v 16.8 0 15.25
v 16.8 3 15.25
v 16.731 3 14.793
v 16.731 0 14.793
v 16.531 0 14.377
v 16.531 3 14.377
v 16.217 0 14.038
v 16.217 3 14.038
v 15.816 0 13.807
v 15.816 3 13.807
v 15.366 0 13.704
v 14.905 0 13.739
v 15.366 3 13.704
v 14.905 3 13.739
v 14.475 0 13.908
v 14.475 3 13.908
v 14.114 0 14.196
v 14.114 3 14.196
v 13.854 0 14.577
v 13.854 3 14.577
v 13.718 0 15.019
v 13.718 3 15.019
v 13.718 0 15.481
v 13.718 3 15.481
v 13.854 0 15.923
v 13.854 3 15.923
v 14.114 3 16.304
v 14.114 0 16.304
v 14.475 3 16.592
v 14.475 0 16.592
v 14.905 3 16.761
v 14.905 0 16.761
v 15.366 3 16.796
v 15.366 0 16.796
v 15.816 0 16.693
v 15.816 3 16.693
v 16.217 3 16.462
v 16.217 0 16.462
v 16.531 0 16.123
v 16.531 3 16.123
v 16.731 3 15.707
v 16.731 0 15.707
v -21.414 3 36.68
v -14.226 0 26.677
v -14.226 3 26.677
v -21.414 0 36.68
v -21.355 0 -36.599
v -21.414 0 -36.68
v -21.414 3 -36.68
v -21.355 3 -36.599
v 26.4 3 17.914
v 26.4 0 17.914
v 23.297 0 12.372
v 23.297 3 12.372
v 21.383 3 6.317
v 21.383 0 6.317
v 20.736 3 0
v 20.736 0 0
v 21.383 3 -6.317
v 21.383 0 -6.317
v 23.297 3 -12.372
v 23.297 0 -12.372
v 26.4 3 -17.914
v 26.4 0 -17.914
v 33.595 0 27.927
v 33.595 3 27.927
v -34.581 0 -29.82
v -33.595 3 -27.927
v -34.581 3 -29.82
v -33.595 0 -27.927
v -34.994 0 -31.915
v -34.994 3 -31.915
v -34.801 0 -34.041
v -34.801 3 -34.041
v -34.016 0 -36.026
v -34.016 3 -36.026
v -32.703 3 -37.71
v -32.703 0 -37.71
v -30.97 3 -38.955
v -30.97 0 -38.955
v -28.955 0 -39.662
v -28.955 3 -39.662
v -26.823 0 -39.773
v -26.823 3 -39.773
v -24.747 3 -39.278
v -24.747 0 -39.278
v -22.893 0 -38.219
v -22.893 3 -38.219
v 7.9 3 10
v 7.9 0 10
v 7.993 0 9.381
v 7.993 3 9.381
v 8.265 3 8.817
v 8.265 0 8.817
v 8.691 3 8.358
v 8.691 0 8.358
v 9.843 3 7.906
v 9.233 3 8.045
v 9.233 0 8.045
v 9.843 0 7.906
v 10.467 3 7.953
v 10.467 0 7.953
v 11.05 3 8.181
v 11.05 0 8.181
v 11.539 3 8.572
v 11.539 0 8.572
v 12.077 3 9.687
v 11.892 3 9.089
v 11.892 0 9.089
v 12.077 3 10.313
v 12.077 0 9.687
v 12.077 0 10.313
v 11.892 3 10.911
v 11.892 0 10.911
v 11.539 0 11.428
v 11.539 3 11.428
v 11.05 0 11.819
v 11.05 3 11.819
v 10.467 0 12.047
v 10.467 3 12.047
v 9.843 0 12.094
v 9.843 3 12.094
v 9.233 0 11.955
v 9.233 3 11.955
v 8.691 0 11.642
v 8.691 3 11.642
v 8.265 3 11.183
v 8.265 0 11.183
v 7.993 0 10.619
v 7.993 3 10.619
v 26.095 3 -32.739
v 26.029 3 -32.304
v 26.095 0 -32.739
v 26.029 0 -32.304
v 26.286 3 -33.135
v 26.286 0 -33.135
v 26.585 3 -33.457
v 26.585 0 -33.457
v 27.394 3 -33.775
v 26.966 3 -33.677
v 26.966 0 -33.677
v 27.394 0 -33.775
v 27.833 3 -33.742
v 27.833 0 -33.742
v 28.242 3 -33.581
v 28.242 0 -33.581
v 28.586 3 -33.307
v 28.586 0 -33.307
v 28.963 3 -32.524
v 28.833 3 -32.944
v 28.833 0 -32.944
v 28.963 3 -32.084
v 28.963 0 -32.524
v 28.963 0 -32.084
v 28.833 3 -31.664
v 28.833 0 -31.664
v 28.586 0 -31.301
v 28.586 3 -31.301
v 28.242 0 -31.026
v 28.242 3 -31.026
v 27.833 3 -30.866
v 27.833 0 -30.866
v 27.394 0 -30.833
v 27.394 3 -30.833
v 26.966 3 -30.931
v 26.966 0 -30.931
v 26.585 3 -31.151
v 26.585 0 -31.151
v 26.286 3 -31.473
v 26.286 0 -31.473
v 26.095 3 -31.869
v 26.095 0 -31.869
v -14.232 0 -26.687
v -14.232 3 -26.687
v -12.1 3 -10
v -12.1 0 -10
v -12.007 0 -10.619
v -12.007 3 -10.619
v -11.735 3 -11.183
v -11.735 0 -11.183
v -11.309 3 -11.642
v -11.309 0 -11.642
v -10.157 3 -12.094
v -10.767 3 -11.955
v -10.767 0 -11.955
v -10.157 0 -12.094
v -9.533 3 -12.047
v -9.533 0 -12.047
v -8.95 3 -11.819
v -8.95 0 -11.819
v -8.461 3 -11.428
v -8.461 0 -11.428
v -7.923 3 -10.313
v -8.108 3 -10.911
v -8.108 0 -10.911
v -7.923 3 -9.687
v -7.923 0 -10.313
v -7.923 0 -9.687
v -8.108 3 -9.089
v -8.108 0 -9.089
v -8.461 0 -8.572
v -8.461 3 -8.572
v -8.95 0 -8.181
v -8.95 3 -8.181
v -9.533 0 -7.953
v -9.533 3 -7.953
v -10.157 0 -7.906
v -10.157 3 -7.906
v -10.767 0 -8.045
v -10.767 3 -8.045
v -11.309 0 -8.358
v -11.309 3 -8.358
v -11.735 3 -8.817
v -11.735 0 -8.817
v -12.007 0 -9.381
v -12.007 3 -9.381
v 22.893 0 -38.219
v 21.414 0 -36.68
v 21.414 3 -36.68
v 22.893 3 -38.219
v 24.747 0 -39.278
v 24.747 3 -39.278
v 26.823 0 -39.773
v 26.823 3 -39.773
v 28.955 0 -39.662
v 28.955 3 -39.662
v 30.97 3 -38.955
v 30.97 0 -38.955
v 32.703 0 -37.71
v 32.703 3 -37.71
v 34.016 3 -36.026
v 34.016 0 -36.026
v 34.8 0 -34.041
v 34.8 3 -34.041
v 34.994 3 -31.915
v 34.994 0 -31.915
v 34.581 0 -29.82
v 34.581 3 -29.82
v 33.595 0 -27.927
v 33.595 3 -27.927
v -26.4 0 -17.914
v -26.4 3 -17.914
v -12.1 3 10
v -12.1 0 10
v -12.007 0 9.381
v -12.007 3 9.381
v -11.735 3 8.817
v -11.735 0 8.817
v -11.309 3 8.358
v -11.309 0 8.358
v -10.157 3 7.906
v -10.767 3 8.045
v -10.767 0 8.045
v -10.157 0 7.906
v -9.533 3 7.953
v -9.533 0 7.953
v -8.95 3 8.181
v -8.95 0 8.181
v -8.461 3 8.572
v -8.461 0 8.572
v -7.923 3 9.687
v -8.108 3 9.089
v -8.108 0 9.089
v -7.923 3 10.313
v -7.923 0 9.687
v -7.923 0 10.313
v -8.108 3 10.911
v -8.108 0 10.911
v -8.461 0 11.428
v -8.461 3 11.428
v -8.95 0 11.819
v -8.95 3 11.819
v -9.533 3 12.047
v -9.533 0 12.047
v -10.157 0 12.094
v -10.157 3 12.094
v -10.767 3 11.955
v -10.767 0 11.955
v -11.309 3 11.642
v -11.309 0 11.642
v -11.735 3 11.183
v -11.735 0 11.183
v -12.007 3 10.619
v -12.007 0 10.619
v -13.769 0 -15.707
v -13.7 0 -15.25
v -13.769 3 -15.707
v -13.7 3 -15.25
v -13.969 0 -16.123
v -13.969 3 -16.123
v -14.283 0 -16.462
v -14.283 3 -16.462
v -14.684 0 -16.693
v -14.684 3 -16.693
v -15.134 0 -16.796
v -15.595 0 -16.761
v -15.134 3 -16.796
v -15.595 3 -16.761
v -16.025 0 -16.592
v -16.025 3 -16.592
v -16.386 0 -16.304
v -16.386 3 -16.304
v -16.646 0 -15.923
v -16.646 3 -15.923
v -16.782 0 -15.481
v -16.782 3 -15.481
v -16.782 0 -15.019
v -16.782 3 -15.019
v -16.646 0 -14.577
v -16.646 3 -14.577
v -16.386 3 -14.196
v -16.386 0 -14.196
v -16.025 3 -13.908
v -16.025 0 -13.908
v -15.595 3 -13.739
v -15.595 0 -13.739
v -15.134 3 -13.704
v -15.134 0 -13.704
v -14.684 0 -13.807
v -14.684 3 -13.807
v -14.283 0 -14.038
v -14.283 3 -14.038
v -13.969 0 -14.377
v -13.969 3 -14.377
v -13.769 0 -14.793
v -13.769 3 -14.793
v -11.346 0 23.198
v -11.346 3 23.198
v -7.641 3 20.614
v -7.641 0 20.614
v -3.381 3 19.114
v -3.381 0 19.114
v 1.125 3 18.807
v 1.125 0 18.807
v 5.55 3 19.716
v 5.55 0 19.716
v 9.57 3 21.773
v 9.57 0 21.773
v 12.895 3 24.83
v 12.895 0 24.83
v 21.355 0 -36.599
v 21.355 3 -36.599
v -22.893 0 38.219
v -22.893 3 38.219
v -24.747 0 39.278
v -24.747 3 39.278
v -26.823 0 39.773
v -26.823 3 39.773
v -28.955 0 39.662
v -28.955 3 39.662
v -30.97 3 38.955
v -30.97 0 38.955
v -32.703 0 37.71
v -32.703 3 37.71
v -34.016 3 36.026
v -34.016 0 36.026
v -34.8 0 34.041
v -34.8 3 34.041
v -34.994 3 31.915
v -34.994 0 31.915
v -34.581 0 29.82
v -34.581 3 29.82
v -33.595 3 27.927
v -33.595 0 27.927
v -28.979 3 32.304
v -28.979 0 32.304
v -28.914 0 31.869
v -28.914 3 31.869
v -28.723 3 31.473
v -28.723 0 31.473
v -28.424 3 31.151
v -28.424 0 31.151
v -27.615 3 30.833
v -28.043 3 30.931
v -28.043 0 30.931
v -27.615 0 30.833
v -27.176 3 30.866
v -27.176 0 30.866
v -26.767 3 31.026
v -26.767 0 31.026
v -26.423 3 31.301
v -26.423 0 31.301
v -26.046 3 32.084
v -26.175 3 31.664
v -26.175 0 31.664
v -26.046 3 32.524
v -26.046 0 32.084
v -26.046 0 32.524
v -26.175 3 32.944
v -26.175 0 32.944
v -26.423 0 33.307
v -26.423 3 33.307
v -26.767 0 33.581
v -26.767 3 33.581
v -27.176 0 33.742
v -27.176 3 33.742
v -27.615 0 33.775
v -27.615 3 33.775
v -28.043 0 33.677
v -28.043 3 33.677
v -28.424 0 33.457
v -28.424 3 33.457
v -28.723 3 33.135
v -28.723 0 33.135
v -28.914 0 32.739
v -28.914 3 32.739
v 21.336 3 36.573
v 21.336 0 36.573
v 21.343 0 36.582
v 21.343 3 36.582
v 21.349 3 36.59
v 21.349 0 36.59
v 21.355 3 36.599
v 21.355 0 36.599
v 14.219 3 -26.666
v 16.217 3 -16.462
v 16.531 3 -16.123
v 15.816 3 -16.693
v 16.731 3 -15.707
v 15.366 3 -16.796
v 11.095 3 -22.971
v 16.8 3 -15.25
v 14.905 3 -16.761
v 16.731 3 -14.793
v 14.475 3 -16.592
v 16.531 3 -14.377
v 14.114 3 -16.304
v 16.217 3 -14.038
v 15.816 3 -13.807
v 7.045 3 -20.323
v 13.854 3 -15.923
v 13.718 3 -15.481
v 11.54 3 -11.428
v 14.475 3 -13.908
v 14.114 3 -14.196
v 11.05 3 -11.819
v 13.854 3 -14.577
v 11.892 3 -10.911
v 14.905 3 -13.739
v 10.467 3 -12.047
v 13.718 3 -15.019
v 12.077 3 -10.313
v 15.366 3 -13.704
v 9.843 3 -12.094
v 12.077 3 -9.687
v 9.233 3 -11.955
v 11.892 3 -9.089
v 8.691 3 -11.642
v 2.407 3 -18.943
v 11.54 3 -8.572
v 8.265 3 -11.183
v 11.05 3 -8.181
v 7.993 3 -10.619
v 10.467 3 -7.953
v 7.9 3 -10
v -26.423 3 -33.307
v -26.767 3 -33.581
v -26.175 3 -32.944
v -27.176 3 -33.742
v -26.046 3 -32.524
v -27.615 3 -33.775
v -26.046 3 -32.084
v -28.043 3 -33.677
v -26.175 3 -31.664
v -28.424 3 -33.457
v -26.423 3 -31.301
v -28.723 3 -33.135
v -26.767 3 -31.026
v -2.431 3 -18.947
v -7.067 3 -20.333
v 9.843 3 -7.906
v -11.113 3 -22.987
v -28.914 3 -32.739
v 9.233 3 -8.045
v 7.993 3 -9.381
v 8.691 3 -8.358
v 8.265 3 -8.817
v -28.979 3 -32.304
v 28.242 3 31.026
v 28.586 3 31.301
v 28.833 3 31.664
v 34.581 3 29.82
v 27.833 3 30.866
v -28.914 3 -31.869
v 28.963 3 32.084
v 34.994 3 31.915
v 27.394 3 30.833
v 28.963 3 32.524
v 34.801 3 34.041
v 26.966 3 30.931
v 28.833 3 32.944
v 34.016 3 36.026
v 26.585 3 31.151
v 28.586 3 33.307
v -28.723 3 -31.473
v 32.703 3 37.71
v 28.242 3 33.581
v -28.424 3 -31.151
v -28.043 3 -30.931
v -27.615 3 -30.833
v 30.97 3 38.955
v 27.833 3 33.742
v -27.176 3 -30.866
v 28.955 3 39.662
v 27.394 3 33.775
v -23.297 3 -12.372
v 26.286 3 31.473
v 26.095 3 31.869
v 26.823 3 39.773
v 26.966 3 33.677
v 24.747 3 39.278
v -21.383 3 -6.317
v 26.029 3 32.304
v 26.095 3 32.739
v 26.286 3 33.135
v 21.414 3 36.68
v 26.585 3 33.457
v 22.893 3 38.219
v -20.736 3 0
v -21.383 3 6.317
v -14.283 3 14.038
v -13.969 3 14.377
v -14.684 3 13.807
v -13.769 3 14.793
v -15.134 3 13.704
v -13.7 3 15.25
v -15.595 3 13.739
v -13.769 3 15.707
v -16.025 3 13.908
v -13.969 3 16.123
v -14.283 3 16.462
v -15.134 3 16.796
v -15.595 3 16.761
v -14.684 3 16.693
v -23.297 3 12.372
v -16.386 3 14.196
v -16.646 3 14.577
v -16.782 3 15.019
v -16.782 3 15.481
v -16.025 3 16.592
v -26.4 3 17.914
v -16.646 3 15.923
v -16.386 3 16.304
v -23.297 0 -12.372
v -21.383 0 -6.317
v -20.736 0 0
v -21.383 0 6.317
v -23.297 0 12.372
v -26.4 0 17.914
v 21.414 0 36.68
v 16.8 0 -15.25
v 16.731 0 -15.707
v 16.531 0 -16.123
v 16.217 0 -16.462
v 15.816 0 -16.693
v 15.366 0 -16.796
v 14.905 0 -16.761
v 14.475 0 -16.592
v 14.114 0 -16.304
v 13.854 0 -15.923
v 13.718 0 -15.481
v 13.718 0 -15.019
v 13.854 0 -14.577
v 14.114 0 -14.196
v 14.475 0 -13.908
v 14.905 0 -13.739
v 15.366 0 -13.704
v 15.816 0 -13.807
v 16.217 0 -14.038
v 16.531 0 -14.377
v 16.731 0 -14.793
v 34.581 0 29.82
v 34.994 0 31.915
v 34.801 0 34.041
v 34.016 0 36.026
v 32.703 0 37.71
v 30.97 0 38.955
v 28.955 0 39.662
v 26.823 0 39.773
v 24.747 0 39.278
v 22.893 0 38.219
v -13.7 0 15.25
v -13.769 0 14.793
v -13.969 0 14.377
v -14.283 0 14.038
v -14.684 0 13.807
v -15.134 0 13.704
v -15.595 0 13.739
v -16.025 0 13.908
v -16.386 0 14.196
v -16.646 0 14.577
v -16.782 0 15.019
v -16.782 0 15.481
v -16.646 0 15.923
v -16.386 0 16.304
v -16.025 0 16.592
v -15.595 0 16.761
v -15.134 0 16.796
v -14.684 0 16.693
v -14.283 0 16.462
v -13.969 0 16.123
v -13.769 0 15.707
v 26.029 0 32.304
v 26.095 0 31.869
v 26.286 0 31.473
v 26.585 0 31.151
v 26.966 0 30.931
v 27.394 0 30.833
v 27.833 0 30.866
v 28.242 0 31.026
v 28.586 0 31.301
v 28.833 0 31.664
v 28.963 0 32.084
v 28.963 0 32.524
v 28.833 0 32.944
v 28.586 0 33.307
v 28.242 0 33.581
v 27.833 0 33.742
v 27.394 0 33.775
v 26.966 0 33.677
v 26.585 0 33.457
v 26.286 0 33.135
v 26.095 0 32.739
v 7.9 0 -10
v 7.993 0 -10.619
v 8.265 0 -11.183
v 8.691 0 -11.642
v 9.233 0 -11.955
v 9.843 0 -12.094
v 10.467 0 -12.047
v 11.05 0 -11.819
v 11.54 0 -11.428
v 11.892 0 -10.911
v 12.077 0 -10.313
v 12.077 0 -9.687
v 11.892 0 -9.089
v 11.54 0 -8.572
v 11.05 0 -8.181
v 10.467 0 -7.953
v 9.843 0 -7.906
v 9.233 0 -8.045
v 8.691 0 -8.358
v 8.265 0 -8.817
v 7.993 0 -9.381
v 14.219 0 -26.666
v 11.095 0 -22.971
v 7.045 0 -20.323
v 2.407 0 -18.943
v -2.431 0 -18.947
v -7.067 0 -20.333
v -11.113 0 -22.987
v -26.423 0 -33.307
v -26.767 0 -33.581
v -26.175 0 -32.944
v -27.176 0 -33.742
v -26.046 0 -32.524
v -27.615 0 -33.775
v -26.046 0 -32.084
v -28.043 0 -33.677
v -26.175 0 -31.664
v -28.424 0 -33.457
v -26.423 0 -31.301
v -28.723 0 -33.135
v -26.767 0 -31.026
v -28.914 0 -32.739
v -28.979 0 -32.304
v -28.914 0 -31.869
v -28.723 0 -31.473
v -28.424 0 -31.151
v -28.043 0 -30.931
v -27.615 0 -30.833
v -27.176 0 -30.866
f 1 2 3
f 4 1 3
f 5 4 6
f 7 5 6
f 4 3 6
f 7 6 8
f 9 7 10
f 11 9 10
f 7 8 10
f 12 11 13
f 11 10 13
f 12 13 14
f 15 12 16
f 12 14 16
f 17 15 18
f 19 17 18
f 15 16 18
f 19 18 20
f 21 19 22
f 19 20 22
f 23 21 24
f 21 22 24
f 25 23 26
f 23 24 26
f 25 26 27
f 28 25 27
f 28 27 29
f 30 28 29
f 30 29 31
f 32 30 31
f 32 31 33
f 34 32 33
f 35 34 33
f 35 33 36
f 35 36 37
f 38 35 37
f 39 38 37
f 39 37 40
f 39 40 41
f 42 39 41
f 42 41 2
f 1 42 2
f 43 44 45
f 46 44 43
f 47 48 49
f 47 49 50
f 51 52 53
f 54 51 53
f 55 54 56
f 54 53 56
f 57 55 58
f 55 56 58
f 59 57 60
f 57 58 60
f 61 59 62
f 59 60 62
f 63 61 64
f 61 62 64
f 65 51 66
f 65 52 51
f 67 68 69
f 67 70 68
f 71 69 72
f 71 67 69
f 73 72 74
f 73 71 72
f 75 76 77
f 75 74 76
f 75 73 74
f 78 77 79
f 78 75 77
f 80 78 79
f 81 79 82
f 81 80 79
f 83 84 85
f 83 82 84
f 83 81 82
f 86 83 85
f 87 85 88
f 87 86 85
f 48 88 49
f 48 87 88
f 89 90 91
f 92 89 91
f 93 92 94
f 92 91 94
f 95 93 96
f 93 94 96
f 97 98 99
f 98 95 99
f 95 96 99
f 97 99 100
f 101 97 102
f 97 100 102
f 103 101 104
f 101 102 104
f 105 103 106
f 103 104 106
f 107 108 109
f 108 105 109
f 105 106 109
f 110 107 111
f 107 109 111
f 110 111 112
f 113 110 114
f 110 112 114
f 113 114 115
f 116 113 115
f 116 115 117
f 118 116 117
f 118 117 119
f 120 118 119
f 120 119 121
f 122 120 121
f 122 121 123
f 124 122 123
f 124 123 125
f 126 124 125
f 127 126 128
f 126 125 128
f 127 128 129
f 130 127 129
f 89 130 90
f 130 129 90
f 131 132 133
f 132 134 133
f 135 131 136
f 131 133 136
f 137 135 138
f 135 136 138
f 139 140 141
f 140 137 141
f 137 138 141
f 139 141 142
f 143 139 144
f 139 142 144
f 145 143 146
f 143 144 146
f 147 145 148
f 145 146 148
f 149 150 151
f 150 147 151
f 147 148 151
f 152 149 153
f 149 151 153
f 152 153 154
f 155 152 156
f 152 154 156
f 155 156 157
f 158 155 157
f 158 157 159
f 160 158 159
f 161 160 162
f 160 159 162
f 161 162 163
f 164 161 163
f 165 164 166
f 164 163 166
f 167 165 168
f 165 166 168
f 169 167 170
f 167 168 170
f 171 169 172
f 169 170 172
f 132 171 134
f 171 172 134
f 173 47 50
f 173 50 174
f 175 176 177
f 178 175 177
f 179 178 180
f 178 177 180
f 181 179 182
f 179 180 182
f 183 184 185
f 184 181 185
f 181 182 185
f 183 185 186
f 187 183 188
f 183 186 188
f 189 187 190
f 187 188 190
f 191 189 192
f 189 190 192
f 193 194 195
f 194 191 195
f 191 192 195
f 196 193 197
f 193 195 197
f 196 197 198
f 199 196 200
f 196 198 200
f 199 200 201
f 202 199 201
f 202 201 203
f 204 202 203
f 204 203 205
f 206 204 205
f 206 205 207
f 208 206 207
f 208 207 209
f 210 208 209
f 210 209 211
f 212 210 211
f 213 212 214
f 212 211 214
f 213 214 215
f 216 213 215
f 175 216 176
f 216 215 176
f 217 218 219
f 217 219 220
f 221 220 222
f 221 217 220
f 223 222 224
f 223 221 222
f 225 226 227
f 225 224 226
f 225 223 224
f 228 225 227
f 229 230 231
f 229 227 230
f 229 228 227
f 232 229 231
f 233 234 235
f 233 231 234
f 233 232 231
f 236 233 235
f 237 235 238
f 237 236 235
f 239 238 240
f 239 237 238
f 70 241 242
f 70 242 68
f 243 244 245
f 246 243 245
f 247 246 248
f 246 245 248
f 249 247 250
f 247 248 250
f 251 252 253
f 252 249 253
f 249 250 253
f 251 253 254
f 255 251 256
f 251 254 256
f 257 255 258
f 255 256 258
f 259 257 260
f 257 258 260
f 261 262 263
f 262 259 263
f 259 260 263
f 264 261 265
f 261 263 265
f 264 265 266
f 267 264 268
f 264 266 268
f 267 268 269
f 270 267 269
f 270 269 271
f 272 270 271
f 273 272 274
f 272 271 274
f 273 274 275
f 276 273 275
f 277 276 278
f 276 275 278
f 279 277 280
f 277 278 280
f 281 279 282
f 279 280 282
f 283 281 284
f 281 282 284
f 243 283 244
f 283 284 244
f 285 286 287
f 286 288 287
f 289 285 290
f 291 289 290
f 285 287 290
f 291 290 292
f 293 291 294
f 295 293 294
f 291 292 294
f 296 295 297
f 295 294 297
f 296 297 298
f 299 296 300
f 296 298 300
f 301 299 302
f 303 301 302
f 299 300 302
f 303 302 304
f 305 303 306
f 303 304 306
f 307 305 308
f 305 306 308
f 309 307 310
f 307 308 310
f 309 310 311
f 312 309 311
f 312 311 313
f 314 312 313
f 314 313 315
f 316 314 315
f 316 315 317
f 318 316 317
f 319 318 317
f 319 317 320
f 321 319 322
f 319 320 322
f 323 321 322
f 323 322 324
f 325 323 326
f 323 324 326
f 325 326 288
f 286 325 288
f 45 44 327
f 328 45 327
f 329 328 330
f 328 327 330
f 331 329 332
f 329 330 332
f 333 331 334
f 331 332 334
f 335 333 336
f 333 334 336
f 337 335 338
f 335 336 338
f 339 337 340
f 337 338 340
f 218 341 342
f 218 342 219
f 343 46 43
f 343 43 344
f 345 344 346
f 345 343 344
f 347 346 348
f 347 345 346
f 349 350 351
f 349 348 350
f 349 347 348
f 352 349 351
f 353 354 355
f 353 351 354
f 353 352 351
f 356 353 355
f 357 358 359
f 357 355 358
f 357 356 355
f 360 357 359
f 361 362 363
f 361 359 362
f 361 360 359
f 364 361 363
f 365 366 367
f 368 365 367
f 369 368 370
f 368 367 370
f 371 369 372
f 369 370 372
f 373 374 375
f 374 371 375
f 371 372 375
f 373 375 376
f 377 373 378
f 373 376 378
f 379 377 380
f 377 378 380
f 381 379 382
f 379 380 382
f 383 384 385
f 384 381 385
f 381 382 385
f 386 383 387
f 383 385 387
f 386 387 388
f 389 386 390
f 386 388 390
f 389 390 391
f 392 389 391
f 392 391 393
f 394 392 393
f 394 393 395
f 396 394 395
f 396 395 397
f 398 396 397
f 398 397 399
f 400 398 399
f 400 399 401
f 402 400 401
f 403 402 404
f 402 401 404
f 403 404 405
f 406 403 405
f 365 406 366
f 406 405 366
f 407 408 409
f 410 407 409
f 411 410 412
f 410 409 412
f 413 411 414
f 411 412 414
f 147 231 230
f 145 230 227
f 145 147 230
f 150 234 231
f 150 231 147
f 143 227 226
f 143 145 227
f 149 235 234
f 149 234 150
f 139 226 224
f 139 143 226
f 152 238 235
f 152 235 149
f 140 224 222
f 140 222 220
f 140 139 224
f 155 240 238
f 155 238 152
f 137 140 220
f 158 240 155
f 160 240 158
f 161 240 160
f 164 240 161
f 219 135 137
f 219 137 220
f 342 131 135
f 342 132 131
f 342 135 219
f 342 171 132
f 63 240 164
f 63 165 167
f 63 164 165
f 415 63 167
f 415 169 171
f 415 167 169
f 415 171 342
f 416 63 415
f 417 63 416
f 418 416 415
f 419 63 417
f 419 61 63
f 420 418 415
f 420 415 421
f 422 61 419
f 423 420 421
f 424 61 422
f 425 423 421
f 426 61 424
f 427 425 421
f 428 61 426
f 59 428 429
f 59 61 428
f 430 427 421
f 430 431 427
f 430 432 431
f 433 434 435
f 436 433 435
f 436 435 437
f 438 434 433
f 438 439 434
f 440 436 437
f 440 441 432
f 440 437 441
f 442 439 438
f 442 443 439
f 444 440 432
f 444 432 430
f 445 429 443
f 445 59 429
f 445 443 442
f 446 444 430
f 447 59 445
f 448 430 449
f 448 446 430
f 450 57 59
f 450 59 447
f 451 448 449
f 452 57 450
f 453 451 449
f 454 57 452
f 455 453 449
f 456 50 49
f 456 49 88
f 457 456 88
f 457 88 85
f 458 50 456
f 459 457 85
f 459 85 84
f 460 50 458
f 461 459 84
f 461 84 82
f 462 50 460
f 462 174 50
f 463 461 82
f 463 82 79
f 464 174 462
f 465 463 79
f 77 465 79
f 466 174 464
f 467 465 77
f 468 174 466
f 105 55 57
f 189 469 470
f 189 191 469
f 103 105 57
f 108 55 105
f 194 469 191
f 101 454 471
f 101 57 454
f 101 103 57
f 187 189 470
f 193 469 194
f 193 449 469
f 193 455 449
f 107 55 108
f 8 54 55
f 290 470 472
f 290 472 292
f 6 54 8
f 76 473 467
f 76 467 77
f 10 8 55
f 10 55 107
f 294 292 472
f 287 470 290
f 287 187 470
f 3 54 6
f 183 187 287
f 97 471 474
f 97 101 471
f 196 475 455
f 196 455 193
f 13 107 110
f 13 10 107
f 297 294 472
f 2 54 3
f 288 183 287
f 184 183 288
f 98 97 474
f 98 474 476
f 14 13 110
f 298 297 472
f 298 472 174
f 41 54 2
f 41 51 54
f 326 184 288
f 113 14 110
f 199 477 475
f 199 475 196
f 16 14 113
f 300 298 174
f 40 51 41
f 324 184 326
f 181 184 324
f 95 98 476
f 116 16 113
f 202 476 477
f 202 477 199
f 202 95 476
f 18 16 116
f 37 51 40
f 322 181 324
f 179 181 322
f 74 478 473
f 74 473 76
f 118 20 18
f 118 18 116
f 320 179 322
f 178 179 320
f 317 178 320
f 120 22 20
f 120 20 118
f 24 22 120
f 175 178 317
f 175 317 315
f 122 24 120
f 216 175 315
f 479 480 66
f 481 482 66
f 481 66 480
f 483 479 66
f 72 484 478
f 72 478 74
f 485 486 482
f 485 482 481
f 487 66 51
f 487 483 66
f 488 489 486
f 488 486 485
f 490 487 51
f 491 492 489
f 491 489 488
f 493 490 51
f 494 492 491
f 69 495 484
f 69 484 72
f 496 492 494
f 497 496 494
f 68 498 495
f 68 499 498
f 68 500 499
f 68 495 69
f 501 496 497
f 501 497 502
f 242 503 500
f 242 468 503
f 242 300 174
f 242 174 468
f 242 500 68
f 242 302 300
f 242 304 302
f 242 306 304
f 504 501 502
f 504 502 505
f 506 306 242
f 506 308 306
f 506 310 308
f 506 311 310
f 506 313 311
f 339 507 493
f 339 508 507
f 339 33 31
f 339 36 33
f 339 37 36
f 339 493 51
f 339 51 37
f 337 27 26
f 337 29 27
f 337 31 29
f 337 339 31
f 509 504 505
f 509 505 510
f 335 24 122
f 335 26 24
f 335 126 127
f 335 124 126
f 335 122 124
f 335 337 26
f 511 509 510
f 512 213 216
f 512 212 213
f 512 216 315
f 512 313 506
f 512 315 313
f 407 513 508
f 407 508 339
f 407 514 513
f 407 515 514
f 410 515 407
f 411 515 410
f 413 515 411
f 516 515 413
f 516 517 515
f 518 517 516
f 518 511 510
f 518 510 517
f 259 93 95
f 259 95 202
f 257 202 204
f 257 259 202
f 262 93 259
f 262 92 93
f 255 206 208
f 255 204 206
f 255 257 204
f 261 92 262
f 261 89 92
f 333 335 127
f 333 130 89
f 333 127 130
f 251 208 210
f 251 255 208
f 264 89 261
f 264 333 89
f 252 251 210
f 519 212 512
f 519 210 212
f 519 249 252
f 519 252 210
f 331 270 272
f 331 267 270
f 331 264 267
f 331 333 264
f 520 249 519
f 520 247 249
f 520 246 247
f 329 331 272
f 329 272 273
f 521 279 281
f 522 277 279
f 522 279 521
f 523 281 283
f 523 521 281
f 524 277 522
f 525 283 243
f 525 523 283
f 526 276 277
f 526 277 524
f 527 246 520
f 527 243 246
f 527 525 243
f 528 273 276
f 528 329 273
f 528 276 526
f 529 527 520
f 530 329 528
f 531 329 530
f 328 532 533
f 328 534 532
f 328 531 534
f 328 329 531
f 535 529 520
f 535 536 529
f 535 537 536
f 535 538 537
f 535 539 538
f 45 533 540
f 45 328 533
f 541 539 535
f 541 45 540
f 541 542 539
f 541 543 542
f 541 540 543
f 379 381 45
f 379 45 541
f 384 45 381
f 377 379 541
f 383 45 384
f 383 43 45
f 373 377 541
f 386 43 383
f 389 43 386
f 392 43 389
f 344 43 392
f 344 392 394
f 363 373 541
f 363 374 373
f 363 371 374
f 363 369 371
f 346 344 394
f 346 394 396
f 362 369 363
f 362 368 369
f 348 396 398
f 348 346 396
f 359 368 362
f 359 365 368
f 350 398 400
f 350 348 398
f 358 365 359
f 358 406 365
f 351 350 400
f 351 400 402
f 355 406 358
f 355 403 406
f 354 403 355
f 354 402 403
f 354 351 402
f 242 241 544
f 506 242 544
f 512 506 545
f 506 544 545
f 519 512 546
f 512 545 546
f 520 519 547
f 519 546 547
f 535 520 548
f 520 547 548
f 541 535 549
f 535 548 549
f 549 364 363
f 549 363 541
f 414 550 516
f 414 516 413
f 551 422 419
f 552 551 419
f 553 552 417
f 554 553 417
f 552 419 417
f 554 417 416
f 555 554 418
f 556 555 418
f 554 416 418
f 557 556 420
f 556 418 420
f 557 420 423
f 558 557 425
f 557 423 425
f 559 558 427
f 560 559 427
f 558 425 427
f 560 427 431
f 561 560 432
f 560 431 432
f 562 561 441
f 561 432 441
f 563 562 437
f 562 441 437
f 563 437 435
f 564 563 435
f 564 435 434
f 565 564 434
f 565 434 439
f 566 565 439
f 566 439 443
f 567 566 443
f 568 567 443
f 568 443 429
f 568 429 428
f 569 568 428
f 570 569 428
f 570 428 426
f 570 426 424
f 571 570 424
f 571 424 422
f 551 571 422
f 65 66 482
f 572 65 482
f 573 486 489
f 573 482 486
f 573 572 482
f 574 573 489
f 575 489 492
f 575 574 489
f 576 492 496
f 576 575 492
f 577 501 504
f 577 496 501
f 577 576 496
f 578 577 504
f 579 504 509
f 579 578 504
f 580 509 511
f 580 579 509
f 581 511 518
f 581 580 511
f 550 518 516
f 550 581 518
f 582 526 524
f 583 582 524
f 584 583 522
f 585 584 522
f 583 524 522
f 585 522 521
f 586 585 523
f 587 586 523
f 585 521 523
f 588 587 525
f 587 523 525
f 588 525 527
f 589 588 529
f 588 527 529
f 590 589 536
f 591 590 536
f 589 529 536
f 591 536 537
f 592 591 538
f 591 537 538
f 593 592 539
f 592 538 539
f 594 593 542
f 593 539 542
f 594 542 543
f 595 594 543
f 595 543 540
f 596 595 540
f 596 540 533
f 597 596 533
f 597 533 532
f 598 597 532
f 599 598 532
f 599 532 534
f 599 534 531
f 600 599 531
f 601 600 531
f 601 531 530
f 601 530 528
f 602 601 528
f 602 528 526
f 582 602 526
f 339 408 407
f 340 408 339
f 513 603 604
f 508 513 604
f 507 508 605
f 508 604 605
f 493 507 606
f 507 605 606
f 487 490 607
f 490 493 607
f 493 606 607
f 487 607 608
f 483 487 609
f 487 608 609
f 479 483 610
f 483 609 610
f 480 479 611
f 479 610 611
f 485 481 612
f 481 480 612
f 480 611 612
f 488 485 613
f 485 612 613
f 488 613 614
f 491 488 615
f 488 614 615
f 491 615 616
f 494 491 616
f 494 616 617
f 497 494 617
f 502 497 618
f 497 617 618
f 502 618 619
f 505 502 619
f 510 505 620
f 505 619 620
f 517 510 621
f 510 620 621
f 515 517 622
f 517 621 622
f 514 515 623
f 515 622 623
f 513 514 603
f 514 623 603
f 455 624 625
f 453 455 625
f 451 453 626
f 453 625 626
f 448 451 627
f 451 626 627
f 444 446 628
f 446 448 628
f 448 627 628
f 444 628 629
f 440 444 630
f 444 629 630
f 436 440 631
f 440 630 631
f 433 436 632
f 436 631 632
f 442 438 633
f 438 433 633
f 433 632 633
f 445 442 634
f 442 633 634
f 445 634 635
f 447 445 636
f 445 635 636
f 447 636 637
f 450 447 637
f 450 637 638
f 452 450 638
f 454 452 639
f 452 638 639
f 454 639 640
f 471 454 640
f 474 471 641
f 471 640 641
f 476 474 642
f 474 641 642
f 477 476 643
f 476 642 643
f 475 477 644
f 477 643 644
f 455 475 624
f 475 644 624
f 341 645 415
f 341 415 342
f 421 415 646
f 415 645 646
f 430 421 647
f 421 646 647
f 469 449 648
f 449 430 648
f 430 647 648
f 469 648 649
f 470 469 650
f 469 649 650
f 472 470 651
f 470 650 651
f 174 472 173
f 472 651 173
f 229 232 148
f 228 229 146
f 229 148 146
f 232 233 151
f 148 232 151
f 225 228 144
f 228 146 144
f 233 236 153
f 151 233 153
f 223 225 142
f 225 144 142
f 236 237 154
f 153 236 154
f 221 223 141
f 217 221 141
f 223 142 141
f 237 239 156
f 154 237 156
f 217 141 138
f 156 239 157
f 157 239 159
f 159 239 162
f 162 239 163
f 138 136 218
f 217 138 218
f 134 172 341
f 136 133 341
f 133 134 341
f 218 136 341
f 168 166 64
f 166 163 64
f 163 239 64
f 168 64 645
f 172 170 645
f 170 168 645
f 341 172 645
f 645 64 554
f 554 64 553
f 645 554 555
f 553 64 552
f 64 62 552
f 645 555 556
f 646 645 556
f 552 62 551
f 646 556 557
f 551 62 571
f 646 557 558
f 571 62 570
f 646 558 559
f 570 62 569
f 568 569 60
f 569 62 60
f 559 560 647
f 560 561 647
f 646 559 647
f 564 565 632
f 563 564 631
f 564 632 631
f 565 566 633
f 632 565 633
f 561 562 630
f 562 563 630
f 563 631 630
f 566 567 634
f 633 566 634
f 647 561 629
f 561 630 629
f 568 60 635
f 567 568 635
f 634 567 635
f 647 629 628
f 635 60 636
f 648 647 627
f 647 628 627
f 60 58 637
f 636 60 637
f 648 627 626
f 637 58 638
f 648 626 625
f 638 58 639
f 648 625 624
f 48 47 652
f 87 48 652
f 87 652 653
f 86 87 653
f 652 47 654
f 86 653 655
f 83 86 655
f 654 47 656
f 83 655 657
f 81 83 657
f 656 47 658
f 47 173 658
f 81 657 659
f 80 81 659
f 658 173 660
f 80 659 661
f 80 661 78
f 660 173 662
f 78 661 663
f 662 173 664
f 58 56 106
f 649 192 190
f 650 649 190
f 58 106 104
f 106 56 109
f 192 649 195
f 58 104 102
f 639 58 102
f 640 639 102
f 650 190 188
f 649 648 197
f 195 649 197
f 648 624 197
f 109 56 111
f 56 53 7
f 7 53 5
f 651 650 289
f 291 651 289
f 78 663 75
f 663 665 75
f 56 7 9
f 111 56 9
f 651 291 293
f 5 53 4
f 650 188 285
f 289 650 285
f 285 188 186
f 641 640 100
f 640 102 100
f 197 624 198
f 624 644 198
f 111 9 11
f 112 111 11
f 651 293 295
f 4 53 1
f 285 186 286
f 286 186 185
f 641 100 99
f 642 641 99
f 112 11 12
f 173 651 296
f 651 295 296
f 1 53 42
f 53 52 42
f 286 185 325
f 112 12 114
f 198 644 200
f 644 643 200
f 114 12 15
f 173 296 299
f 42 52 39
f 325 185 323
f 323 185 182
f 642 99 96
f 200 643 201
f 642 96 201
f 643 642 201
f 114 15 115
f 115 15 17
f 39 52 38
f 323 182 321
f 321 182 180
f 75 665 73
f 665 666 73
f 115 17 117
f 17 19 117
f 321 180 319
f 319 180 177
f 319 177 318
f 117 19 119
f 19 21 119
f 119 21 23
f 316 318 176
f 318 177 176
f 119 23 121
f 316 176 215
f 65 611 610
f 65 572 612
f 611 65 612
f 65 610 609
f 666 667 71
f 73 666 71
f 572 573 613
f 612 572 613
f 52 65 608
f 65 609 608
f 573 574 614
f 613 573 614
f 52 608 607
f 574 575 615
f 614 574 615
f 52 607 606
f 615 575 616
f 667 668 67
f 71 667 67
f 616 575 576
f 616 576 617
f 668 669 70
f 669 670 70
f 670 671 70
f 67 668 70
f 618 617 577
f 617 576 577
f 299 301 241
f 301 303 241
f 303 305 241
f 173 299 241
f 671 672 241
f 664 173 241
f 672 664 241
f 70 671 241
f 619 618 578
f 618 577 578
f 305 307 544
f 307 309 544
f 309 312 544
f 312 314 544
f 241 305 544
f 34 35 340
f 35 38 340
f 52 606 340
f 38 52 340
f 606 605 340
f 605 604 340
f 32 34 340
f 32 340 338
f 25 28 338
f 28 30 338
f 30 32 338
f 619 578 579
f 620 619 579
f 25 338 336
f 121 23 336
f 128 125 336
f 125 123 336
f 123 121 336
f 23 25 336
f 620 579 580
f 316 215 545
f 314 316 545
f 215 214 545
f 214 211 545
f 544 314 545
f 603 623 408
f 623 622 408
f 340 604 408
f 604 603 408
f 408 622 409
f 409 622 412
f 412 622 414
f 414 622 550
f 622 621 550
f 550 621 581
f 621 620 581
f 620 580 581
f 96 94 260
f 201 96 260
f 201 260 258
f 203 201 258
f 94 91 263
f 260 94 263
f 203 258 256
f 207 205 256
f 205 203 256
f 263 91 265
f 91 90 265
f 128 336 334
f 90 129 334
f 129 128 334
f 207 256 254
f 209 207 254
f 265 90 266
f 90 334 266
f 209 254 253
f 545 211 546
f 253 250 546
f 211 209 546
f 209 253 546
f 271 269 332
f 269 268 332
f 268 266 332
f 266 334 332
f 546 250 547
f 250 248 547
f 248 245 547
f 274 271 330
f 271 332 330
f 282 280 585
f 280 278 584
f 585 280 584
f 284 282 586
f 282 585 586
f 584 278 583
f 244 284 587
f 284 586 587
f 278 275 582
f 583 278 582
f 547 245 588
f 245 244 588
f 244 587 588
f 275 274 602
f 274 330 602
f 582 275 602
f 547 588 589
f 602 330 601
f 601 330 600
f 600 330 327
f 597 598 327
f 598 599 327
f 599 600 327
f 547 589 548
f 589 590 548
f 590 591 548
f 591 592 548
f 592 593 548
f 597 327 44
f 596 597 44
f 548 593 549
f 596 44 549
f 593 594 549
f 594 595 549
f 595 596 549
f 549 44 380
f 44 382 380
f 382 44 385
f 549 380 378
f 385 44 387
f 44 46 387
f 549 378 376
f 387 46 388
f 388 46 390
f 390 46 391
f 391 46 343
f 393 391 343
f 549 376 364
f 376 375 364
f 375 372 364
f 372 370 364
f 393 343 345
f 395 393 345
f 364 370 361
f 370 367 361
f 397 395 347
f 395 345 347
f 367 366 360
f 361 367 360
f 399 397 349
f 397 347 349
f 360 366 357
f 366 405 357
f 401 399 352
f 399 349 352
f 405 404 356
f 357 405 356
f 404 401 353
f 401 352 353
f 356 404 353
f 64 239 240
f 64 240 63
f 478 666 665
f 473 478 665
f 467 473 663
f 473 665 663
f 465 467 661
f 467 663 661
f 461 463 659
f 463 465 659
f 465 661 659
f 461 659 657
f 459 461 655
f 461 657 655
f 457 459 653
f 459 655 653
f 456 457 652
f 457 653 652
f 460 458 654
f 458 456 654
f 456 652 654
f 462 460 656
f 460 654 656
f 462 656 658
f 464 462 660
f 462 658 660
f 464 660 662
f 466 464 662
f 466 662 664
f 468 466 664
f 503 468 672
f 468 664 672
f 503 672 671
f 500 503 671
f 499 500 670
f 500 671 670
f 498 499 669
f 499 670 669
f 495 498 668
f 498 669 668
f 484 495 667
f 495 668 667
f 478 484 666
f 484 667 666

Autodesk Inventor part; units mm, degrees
ref_plane "YZ Plane" through (0, 0, 0) normal (1, 0, 0) x (0, 1, 0)
ref_plane "XZ Plane" through (0, 0, 0) normal (0, 1, 0) x (-1, 0, 0)
ref_plane "XY Plane" through (0, 0, 0) normal (0, 0, 1) x (1, 0, 0)
sketch "Sketch1" plane through (0, 0, 0) normal (0, 1, 0) x (-1, 0, 0)
  arc A0 (-2.9502, -0.8481) -> (-2.9502, 0.8481) centre (-3.48, 0) ccw
  line L0 (-2.9502, 0.8481) -> (-7.8639, 3.9177)
  arc A1 (-7.8639, 3.9177) -> (-9.3575, 3.336) centre (-8.3937, 3.0696) ccw
  line L1 (-9.3575, 3.336) -> (-10.206, 0.2664)
  arc A2 (-10.206, 0.2664) -> (-10.206, -0.2664) centre (-9.2421, 0) ccw
  line L2 (-10.206, -0.2664) -> (-9.3575, -3.336)
  arc A3 (-9.3575, -3.336) -> (-7.8639, -3.9177) centre (-8.3937, -3.0696) ccw
  line L3 (-7.8639, -3.9177) -> (-2.9502, -0.8481)
  line L4 (-21.4137, 36.6803) -> (-21.3554, 36.5991)
  line L5 (18.0989, 21.6995) -> (22.3004, 27.5465)
  circle A4 centre (27.5044, 32.3038) radius 1.475
  line L6 (7.8639, 3.9177) -> (2.9502, 0.8481)
  arc A5 (2.9502, 0.8481) -> (2.9502, -0.8481) centre (3.48, 0) ccw
  line L7 (2.9502, -0.8481) -> (7.8639, -3.9177)
  arc A6 (7.8639, -3.9177) -> (9.3575, -3.336) centre (8.3937, -3.0696) ccw
  line L8 (9.3575, -3.336) -> (10.206, -0.2664)
  arc A7 (10.206, -0.2664) -> (10.206, 0.2664) centre (9.2421, 0) ccw
  line L9 (10.206, 0.2664) -> (9.3575, 3.336)
  arc A8 (9.3575, 3.336) -> (7.8639, 3.9177) centre (8.3937, 3.0696) ccw
  line L10 (-24.6555, 25.8542) -> (-20.454, 20.0072)
  arc A9 (-20.454, 20.0072) -> (-18.0989, 21.6995) centre (-19.2764, 20.8534) ccw
  line L11 (-18.0989, 21.6995) -> (-22.3004, 27.5465)
  arc A10 (-22.3004, 27.5465) -> (-24.6555, 25.8542) centre (-23.4779, 26.7004) ccw
  line L12 (14.2256, 26.6769) -> (21.4137, 36.6803)
  arc A11 (-26.3995, -17.9136) -> (-26.3995, 17.9136) centre (-51.8984, 0) ccw
  arc A12 (26.3995, 17.9136) -> (26.3995, -17.9136) centre (51.8984, 0) ccw
  line L13 (-21.3365, 36.5729) -> (-12.8954, 24.8295)
  arc A13 (-12.8954, 24.8295) -> (14.2256, 26.6769) centre (-0.0002, 35.5195) ccw
  arc A14 (18.0989, 21.6995) -> (20.454, 20.0072) centre (19.2764, 20.8534) ccw
  line L14 (24.6555, 25.8542) -> (20.454, 20.0072)
  circle A15 centre (15.2498, 15.25) radius 1.475
  arc A16 (-21.3554, 36.5991) -> (-21.3365, 36.5729) centre (0, 51.9445) ccw
  circle A17 centre (-15.2502, 15.25) radius 1.475
  line L15 (33.595, 27.9272) -> (26.3995, 17.9136)
  arc A18 (24.6555, 25.8542) -> (22.3004, 27.5465) centre (23.4779, 26.7004) ccw
  arc A19 (33.595, 27.9272) -> (21.4137, 36.6803) centre (27.5044, 32.3038) ccw
  line L16 (-22.3004, -27.5465) -> (-18.0989, -21.6995)
  arc A20 (-18.0989, -21.6995) -> (-20.454, -20.0072) centre (-19.2764, -20.8534) ccw
  line L17 (-20.454, -20.0072) -> (-24.6555, -25.8542)
  arc A21 (-24.6555, -25.8542) -> (-22.3004, -27.5465) centre (-23.4779, -26.7004) ccw
  circle A22 centre (10, 10) radius 2.1
  circle A23 centre (-10, 10) radius 2.1
  arc A24 (-21.4137, 36.6803) -> (-33.595, 27.9272) centre (-27.5044, 32.3038) ccw
  line L18 (-26.3995, 17.9136) -> (-33.595, 27.9272)
  circle A25 centre (-27.5044, 32.3038) radius 1.475
  line L19 (-21.3554, -36.5991) -> (-21.4137, -36.6803)
  circle A26 centre (15.2498, -15.25) radius 1.475
  line L20 (18.0989, -21.6995) -> (22.3004, -27.5465)
  arc A27 (22.3004, -27.5465) -> (24.6555, -25.8542) centre (23.4779, -26.7004) ccw
  line L21 (24.6555, -25.8542) -> (20.454, -20.0072)
  arc A28 (20.454, -20.0072) -> (18.0989, -21.6995) centre (19.2764, -20.8534) ccw
  circle A29 centre (27.5044, -32.3038) radius 1.475
  circle A30 centre (-10.0002, -10) radius 2.1
  circle A31 centre (10, -10) radius 2.1
  line L22 (-14.2191, -26.666) -> (-21.3554, -36.5991)
  line L23 (21.3554, -36.5991) -> (14.2318, -26.6869)
  circle A32 centre (-15.2502, -15.25) radius 1.475
  circle A33 centre (-27.5044, -32.3038) radius 1.475
  arc A34 (21.4137, -36.6803) -> (33.595, -27.9272) centre (27.5044, -32.3038) ccw
  line L24 (-33.595, -27.9272) -> (-26.3995, -17.9136)
  arc A35 (14.2318, -26.6869) -> (-14.2191, -26.666) centre (-0.0002, -35.5195) ccw
  line L25 (26.3995, -17.9136) -> (33.595, -27.9272)
  line L26 (21.4137, -36.6803) -> (21.3554, -36.5991)
  arc A36 (-33.595, -27.9272) -> (-21.4137, -36.6803) centre (-27.5044, -32.3038) ccw
  line L27 (3.48, 0) -> (-3.48, 0) construction
  point P0 (0, 0)
  point P1 (0, 0)
  point P2 (-21.4137, 36.6803)
  point P3 (-33.595, 27.9272)
  point P4 (-21.4137, -36.6803)
  point P5 (21.4137, -36.6803)
  point P6 (21.4137, 36.6803)
  point P7 (-12.8954, 24.8295)
  point P8 (-21.3365, 36.5729)
  point P9 (-21.3554, 36.5991)
extrude "Extrusion1" add sketch "Sketch1" along normal blind 3 contours L3 A3 L2 A2 L1 A1 L0 A0 | L4 A16 L13 A13 L12 A19 L15 A12 L25 A34 L26 L23 A35 L22 L19 A36 L24 A11 L18 A24 | L5 A18 L14 A14 | A8 L9 A7 L8 A6 L7 A5 L6 | A10 L11 A9 L10 | A21 L17 A20 L16 | A28 L21 A27 L20
sketch "Sketch2" plane through (0, 3, 0) normal (0, 1, 0) x (1, 0, 0)
  circle A0 centre (-15.2498, 15.25) radius 1.475 construction
  circle A1 centre (15.2502, 15.25) radius 1.475 construction
  circle A2 centre (15.2502, -15.25) radius 1.475 construction
  circle A3 centre (-15.2498, -15.25) radius 1.475 construction
  circle A4 centre (-15.2498, 15.25) radius 1.475 projected
  circle A5 centre (-15.2498, 15.25) radius 1.55
  circle A6 centre (15.2502, 15.25) radius 1.475 projected
  circle A7 centre (15.2502, 15.25) radius 1.55
  circle A8 centre (15.2502, -15.25) radius 1.475 projected
  circle A9 centre (15.2502, -15.25) radius 1.55
  circle A10 centre (-15.2498, -15.25) radius 1.55
  point P0 (0, 0)
  dimension "d2" = 3.1
  dimension "d3" = 3.1
  dimension "d4" = 3.1
  dimension "d5" = 3.1
extrude "Extrusion2" cut sketch "Sketch2" against normal through all contours A4 | A5 | A6 | A7 | A8 | A9 | A10
properties part number "bottom plate"
